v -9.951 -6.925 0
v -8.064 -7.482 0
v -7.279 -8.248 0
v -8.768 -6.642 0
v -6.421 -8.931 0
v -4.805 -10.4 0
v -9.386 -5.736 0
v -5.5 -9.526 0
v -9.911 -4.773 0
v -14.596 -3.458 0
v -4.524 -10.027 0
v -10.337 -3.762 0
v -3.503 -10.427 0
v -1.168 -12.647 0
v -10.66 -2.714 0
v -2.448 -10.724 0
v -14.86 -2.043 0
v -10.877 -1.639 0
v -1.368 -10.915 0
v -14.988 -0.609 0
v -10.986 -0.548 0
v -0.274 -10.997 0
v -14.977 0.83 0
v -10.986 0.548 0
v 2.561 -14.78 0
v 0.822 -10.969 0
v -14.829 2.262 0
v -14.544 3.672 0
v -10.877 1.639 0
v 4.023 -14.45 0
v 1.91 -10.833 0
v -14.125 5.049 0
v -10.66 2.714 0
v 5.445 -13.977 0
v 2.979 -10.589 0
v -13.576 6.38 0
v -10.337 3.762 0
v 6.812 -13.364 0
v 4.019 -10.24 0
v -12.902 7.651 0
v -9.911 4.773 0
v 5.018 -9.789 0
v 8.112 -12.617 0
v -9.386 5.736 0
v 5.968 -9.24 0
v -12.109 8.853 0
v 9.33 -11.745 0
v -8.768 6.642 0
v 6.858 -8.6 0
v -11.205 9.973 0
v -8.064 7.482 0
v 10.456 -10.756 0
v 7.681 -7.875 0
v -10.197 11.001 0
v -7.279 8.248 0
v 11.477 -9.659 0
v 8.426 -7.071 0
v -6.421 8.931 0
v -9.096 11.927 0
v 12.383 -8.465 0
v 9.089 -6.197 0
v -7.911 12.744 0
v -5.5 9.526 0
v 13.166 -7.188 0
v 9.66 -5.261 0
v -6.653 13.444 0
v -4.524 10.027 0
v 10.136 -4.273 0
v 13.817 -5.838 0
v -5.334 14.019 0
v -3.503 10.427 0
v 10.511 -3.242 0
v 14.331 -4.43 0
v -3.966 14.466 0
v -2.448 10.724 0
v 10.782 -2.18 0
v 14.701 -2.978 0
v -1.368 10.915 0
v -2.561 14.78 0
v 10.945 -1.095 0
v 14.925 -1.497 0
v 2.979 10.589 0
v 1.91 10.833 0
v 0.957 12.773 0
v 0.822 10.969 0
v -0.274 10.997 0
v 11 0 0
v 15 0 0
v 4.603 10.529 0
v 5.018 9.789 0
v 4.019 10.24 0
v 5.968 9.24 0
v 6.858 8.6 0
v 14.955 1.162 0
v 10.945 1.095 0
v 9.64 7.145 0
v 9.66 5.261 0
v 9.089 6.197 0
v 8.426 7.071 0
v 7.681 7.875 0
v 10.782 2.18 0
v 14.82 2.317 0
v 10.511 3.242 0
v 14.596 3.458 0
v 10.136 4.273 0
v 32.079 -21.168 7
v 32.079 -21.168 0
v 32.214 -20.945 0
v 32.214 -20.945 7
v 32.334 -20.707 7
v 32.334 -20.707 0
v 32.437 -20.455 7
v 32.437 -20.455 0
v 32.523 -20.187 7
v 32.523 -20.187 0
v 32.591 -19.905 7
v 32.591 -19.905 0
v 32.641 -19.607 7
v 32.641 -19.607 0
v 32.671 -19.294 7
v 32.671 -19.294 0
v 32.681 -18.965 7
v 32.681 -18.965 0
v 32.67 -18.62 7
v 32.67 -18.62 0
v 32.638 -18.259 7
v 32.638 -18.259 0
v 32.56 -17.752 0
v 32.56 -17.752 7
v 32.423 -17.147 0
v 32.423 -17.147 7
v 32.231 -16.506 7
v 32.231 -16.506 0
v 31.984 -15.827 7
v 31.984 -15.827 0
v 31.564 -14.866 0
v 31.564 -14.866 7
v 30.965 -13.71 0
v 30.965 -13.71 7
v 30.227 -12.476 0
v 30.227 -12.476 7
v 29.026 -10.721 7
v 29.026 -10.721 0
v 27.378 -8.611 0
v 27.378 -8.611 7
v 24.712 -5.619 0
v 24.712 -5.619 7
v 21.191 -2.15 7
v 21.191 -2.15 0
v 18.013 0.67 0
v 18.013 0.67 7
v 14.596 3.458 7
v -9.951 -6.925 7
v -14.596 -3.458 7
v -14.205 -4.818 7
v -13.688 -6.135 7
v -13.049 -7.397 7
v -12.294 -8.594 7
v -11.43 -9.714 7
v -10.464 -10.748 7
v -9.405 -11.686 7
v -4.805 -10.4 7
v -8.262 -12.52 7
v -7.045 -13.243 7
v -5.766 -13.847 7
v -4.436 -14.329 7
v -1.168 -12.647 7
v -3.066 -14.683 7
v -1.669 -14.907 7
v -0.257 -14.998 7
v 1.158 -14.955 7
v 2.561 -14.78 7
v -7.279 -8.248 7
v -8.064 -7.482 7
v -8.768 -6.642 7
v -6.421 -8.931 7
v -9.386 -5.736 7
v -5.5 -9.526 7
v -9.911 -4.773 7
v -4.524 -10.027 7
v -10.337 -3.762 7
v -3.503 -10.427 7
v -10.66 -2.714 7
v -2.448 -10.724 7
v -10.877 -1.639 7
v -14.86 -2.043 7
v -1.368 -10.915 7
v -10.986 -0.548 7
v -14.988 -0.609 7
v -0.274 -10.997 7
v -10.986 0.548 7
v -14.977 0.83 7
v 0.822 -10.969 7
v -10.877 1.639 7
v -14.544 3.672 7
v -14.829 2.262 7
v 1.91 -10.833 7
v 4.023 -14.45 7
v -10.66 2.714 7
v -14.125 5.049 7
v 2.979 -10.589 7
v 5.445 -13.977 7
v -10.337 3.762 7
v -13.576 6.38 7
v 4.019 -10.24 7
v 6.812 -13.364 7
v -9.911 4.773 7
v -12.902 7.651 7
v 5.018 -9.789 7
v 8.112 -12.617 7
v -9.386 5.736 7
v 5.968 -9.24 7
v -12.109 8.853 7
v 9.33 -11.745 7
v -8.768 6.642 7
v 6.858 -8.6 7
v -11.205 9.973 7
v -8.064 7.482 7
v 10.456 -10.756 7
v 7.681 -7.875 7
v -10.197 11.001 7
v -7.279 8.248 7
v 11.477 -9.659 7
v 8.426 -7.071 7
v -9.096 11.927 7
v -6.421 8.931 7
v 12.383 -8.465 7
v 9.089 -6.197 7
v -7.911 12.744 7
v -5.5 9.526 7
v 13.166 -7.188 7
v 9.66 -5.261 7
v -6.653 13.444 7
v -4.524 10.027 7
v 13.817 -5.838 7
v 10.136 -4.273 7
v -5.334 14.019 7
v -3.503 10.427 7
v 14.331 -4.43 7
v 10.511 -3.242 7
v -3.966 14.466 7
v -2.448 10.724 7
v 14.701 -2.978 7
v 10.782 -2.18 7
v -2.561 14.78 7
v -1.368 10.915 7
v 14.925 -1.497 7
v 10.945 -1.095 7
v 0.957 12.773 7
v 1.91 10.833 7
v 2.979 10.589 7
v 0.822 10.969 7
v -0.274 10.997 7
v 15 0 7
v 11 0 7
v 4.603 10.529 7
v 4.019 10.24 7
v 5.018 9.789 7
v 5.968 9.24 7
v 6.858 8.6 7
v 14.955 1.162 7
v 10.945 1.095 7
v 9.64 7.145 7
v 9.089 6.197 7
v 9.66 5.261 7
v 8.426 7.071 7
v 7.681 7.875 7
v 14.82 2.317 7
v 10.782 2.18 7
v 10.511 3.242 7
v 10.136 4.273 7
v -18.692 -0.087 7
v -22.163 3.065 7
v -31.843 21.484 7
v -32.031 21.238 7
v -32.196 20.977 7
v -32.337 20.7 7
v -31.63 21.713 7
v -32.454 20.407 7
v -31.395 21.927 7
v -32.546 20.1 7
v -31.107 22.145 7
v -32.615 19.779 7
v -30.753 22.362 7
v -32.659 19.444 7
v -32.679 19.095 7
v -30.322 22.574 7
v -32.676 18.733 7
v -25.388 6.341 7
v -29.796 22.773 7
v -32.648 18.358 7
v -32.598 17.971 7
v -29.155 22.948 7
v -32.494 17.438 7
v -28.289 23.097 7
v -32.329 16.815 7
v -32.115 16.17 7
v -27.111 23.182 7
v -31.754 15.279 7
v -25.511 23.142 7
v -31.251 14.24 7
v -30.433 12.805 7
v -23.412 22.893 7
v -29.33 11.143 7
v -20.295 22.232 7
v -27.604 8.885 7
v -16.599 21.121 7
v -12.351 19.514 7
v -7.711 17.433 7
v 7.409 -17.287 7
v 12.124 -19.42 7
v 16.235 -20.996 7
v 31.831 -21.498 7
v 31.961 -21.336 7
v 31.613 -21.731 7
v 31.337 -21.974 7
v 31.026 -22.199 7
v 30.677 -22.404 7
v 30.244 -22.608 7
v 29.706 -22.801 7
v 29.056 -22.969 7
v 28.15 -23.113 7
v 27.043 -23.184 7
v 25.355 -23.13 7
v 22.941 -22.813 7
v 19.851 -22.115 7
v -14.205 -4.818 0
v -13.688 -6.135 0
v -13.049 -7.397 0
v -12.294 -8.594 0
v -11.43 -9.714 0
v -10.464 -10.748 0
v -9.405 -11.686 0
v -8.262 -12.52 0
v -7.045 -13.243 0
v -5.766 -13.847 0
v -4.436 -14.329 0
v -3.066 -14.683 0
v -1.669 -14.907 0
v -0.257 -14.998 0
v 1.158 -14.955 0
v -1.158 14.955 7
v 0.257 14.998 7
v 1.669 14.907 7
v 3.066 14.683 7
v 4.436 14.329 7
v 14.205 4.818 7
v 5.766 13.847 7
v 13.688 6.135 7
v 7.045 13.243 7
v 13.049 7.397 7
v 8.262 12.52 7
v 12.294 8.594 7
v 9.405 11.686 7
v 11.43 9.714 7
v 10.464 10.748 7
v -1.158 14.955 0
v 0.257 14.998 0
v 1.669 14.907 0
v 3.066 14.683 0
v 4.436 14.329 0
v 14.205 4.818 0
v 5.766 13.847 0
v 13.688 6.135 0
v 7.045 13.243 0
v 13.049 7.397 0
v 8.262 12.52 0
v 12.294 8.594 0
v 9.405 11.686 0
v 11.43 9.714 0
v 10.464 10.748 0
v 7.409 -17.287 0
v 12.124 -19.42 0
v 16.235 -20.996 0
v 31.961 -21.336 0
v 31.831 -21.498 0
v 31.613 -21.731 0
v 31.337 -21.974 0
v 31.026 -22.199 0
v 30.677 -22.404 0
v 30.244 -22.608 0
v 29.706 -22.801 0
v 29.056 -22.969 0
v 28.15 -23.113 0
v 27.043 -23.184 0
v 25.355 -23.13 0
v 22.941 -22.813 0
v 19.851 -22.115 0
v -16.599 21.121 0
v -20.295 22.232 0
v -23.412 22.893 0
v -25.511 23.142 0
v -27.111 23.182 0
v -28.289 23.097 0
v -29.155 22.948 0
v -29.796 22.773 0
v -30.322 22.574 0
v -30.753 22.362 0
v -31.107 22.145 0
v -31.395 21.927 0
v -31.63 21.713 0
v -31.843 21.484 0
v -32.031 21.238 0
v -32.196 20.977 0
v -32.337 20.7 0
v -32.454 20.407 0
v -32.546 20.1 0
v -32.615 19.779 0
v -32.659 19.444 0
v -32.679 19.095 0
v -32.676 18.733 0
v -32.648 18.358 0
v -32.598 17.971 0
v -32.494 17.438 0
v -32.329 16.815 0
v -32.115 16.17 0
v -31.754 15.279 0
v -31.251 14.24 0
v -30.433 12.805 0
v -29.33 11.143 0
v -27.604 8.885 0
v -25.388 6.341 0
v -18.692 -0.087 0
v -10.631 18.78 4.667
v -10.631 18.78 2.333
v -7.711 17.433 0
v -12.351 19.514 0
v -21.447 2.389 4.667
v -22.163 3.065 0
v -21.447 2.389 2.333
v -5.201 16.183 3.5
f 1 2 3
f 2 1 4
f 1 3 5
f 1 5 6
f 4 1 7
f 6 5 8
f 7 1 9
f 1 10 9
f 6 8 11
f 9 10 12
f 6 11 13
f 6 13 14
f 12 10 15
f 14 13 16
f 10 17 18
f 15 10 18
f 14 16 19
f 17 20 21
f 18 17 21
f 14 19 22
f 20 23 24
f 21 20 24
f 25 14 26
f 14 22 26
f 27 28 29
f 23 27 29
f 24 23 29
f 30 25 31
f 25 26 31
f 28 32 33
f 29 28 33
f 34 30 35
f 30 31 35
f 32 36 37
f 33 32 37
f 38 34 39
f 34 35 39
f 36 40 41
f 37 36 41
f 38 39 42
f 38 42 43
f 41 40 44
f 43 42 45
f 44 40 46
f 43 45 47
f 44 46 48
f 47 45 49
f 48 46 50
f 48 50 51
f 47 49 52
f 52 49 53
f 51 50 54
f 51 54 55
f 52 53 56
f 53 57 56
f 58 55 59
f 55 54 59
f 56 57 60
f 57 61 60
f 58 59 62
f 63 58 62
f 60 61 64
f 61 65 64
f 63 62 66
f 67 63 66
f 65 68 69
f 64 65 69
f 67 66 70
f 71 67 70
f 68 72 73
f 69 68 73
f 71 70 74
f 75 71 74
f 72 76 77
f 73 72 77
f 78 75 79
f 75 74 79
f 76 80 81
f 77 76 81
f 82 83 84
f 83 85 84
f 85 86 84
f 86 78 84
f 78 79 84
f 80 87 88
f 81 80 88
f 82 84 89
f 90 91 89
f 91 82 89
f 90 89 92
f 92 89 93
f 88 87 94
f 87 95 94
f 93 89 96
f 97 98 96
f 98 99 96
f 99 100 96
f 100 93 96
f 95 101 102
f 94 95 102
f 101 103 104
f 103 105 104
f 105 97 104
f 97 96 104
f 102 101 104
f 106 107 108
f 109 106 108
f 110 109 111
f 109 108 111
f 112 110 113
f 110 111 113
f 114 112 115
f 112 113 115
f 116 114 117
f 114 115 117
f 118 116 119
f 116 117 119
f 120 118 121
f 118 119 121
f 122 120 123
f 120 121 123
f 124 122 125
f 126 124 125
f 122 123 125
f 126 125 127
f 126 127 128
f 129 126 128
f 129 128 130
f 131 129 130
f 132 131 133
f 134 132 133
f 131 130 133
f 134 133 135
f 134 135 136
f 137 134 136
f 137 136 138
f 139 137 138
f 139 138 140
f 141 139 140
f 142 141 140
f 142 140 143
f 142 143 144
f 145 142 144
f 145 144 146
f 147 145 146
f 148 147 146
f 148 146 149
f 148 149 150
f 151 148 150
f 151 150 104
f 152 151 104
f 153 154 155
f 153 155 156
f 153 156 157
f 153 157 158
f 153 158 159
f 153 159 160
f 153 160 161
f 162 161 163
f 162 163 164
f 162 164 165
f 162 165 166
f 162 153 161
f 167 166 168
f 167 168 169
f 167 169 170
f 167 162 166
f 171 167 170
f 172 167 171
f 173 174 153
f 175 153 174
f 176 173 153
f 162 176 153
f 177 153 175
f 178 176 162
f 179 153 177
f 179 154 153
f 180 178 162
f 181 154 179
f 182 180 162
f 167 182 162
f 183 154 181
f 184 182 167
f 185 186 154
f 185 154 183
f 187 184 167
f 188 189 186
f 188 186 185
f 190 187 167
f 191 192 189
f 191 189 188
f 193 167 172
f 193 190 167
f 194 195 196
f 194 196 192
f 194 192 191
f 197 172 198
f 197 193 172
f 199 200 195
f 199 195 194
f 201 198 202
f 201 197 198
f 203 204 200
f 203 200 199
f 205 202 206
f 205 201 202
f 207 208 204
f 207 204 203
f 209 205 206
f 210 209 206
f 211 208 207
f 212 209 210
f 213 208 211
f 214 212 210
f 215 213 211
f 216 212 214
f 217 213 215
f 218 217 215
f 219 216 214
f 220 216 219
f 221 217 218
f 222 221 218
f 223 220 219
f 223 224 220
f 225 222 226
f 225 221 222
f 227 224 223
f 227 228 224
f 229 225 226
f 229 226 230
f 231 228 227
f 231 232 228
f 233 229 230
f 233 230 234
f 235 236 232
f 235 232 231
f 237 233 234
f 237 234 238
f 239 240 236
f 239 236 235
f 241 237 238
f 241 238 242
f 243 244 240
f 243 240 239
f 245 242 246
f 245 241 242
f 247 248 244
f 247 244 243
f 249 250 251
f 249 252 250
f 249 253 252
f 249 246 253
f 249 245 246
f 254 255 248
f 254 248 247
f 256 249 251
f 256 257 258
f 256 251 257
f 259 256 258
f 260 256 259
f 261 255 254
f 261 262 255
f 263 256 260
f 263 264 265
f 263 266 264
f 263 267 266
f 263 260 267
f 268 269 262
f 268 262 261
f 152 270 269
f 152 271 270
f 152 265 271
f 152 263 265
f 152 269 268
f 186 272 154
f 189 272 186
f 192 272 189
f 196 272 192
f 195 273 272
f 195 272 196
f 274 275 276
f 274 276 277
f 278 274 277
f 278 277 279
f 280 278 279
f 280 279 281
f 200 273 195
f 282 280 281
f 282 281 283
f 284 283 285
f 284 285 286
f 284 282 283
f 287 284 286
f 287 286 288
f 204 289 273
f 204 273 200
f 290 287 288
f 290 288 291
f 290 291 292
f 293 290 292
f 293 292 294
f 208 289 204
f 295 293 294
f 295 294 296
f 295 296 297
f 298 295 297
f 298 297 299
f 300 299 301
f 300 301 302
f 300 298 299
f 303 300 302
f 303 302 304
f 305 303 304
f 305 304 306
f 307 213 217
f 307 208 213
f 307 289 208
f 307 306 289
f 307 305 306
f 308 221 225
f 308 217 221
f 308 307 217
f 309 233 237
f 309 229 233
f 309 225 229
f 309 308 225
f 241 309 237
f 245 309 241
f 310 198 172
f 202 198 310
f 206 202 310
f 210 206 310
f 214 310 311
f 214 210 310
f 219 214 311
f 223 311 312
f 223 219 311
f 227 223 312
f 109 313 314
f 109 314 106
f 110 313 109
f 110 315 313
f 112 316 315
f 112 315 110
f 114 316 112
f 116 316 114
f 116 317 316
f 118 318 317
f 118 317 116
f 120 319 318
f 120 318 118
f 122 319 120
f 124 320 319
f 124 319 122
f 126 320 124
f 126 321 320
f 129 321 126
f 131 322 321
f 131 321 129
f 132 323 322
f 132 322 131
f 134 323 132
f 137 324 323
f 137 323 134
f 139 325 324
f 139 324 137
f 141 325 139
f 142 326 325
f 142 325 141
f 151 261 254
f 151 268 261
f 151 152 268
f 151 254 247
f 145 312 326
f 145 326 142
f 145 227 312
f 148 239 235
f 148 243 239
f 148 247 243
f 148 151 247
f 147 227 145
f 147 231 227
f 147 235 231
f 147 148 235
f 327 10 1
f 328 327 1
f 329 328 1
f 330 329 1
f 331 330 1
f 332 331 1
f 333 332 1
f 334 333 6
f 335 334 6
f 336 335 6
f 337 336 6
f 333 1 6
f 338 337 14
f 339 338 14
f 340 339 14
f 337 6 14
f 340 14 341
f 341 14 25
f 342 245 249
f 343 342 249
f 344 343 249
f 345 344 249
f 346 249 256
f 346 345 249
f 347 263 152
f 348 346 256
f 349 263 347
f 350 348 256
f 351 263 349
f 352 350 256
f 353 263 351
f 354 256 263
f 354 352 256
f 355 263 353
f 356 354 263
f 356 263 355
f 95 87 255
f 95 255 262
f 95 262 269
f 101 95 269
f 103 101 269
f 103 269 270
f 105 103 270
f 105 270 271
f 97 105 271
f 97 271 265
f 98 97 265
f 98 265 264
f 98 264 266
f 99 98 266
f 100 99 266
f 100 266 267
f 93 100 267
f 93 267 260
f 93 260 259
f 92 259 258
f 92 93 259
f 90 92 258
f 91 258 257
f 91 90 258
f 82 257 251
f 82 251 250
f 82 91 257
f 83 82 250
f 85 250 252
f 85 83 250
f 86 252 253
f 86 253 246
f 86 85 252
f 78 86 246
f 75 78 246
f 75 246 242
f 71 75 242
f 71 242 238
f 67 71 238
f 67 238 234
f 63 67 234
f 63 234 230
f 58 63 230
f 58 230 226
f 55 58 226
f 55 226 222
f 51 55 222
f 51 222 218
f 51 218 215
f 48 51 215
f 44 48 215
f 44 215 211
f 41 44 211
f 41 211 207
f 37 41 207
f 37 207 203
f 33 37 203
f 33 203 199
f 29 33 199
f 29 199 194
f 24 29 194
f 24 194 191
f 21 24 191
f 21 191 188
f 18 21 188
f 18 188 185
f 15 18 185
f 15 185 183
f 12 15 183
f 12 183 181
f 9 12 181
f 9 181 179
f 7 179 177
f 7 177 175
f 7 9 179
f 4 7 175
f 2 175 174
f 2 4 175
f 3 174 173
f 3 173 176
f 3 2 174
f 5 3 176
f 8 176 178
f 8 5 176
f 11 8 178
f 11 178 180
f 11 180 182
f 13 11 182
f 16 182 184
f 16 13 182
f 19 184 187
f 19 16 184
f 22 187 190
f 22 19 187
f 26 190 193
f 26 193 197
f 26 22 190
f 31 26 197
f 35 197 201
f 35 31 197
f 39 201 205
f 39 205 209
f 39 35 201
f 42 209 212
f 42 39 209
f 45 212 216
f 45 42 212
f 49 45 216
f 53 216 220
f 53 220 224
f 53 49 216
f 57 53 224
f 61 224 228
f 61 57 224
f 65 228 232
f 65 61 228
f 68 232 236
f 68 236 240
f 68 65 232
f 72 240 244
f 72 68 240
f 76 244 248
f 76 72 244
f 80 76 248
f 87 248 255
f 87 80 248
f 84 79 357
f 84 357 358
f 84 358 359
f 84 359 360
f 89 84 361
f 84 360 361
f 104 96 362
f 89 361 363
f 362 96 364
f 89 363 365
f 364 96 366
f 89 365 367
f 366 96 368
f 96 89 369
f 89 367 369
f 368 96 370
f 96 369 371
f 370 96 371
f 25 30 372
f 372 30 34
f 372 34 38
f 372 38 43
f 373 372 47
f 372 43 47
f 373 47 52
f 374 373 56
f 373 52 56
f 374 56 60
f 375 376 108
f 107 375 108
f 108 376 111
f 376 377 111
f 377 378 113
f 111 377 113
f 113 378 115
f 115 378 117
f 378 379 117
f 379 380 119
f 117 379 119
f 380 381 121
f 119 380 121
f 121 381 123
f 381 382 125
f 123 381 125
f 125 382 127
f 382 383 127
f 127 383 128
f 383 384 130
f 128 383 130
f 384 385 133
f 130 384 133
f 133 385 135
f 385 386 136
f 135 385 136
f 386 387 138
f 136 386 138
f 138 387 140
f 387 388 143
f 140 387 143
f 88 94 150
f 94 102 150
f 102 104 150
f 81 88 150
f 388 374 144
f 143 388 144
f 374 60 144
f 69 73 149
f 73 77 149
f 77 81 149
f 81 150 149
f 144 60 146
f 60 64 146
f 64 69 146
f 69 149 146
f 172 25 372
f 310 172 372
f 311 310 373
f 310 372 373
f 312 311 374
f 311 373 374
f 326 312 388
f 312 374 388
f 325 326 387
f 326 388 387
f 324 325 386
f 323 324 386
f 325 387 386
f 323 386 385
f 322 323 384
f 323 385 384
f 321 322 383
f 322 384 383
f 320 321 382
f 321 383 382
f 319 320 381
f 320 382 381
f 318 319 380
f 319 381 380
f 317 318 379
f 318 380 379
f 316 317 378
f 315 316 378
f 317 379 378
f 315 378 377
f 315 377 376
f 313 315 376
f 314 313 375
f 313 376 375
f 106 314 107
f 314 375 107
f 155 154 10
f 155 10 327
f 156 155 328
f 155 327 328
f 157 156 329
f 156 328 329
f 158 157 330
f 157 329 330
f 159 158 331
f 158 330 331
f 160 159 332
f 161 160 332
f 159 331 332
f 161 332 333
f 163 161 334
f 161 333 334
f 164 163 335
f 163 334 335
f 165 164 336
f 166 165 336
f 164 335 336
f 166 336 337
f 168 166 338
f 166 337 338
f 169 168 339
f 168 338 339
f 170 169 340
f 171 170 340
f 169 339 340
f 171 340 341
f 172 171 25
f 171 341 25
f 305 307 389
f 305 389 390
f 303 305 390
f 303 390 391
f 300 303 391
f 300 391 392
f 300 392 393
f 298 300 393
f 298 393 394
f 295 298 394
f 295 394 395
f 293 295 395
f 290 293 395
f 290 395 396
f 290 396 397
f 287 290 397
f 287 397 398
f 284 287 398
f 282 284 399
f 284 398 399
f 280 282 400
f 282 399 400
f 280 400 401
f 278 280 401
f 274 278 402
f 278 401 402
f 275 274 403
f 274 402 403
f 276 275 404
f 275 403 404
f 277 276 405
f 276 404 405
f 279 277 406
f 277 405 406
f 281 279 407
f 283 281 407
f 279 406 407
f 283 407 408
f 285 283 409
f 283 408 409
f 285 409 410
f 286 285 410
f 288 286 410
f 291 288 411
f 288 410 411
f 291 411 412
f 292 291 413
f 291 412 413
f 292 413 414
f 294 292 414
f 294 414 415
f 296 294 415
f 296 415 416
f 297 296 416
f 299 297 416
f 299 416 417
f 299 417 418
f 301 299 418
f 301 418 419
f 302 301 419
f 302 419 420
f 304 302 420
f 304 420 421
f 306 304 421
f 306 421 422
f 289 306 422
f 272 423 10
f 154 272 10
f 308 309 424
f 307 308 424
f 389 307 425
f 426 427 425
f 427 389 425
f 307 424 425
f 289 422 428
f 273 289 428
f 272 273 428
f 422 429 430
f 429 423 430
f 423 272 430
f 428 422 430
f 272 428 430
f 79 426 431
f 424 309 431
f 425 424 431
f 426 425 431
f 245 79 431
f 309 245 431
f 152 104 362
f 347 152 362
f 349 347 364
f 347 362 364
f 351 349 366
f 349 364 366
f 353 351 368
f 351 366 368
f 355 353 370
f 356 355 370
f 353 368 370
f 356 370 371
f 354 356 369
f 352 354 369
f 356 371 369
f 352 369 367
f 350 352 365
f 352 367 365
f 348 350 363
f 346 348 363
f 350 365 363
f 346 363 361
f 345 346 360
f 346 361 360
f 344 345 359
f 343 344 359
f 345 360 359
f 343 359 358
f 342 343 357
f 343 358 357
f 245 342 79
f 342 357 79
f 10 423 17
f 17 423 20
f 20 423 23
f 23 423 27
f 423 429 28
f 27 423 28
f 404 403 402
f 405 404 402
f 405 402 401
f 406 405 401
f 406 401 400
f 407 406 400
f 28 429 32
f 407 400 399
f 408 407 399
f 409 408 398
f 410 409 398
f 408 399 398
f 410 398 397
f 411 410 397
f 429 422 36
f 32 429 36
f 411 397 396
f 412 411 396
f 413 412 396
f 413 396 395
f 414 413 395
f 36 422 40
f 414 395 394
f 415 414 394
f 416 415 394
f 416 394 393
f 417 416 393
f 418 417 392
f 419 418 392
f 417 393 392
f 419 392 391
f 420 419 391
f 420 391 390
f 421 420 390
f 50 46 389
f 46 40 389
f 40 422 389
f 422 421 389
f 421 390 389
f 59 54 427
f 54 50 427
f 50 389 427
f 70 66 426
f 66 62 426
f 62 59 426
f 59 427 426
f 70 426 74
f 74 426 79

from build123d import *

# Parameters (mm, degrees)
F0_R     = 15
F0_R_2   = 11
F1_DEPTH = 7
F3_DEPTH = 7
F4_DEPTH = 25.4


with BuildPart() as f1:
    # F0 (on Top) → F1 (new body)
    with BuildSketch(Plane.XY):
        Circle(F0_R)
        Circle(F0_R_2, mode=Mode.SUBTRACT)
    extrude(amount=F1_DEPTH)

    # F2 (on Top) → F3 (join)
    with BuildSketch(Plane.XY):
        with BuildLine():
            add(Edge.make_bspline(
                [(32.078598, -21.168148), (42.894787, -4.777098), (-10.631204, 18.779599), (-64.157195, 42.336296), (-21.447393, 2.388549), (21.262409, -37.559198), (32.078598, -21.168148)],
                knots=[0, 0, 0, 2.094395, 2.094395, 4.18879, 4.18879, 6.283185, 6.283185, 6.283185], degree=2, weights=[1, 0.5, 1, 0.5, 1, 0.5, 1]))
        make_face()
    extrude(amount=F3_DEPTH)

    # F0 (on Top) → F4 (cut)
    with BuildSketch(Plane.XY):
        Circle(F0_R_2)
    extrude(amount=F4_DEPTH, mode=Mode.SUBTRACT)


solid = f1.part
